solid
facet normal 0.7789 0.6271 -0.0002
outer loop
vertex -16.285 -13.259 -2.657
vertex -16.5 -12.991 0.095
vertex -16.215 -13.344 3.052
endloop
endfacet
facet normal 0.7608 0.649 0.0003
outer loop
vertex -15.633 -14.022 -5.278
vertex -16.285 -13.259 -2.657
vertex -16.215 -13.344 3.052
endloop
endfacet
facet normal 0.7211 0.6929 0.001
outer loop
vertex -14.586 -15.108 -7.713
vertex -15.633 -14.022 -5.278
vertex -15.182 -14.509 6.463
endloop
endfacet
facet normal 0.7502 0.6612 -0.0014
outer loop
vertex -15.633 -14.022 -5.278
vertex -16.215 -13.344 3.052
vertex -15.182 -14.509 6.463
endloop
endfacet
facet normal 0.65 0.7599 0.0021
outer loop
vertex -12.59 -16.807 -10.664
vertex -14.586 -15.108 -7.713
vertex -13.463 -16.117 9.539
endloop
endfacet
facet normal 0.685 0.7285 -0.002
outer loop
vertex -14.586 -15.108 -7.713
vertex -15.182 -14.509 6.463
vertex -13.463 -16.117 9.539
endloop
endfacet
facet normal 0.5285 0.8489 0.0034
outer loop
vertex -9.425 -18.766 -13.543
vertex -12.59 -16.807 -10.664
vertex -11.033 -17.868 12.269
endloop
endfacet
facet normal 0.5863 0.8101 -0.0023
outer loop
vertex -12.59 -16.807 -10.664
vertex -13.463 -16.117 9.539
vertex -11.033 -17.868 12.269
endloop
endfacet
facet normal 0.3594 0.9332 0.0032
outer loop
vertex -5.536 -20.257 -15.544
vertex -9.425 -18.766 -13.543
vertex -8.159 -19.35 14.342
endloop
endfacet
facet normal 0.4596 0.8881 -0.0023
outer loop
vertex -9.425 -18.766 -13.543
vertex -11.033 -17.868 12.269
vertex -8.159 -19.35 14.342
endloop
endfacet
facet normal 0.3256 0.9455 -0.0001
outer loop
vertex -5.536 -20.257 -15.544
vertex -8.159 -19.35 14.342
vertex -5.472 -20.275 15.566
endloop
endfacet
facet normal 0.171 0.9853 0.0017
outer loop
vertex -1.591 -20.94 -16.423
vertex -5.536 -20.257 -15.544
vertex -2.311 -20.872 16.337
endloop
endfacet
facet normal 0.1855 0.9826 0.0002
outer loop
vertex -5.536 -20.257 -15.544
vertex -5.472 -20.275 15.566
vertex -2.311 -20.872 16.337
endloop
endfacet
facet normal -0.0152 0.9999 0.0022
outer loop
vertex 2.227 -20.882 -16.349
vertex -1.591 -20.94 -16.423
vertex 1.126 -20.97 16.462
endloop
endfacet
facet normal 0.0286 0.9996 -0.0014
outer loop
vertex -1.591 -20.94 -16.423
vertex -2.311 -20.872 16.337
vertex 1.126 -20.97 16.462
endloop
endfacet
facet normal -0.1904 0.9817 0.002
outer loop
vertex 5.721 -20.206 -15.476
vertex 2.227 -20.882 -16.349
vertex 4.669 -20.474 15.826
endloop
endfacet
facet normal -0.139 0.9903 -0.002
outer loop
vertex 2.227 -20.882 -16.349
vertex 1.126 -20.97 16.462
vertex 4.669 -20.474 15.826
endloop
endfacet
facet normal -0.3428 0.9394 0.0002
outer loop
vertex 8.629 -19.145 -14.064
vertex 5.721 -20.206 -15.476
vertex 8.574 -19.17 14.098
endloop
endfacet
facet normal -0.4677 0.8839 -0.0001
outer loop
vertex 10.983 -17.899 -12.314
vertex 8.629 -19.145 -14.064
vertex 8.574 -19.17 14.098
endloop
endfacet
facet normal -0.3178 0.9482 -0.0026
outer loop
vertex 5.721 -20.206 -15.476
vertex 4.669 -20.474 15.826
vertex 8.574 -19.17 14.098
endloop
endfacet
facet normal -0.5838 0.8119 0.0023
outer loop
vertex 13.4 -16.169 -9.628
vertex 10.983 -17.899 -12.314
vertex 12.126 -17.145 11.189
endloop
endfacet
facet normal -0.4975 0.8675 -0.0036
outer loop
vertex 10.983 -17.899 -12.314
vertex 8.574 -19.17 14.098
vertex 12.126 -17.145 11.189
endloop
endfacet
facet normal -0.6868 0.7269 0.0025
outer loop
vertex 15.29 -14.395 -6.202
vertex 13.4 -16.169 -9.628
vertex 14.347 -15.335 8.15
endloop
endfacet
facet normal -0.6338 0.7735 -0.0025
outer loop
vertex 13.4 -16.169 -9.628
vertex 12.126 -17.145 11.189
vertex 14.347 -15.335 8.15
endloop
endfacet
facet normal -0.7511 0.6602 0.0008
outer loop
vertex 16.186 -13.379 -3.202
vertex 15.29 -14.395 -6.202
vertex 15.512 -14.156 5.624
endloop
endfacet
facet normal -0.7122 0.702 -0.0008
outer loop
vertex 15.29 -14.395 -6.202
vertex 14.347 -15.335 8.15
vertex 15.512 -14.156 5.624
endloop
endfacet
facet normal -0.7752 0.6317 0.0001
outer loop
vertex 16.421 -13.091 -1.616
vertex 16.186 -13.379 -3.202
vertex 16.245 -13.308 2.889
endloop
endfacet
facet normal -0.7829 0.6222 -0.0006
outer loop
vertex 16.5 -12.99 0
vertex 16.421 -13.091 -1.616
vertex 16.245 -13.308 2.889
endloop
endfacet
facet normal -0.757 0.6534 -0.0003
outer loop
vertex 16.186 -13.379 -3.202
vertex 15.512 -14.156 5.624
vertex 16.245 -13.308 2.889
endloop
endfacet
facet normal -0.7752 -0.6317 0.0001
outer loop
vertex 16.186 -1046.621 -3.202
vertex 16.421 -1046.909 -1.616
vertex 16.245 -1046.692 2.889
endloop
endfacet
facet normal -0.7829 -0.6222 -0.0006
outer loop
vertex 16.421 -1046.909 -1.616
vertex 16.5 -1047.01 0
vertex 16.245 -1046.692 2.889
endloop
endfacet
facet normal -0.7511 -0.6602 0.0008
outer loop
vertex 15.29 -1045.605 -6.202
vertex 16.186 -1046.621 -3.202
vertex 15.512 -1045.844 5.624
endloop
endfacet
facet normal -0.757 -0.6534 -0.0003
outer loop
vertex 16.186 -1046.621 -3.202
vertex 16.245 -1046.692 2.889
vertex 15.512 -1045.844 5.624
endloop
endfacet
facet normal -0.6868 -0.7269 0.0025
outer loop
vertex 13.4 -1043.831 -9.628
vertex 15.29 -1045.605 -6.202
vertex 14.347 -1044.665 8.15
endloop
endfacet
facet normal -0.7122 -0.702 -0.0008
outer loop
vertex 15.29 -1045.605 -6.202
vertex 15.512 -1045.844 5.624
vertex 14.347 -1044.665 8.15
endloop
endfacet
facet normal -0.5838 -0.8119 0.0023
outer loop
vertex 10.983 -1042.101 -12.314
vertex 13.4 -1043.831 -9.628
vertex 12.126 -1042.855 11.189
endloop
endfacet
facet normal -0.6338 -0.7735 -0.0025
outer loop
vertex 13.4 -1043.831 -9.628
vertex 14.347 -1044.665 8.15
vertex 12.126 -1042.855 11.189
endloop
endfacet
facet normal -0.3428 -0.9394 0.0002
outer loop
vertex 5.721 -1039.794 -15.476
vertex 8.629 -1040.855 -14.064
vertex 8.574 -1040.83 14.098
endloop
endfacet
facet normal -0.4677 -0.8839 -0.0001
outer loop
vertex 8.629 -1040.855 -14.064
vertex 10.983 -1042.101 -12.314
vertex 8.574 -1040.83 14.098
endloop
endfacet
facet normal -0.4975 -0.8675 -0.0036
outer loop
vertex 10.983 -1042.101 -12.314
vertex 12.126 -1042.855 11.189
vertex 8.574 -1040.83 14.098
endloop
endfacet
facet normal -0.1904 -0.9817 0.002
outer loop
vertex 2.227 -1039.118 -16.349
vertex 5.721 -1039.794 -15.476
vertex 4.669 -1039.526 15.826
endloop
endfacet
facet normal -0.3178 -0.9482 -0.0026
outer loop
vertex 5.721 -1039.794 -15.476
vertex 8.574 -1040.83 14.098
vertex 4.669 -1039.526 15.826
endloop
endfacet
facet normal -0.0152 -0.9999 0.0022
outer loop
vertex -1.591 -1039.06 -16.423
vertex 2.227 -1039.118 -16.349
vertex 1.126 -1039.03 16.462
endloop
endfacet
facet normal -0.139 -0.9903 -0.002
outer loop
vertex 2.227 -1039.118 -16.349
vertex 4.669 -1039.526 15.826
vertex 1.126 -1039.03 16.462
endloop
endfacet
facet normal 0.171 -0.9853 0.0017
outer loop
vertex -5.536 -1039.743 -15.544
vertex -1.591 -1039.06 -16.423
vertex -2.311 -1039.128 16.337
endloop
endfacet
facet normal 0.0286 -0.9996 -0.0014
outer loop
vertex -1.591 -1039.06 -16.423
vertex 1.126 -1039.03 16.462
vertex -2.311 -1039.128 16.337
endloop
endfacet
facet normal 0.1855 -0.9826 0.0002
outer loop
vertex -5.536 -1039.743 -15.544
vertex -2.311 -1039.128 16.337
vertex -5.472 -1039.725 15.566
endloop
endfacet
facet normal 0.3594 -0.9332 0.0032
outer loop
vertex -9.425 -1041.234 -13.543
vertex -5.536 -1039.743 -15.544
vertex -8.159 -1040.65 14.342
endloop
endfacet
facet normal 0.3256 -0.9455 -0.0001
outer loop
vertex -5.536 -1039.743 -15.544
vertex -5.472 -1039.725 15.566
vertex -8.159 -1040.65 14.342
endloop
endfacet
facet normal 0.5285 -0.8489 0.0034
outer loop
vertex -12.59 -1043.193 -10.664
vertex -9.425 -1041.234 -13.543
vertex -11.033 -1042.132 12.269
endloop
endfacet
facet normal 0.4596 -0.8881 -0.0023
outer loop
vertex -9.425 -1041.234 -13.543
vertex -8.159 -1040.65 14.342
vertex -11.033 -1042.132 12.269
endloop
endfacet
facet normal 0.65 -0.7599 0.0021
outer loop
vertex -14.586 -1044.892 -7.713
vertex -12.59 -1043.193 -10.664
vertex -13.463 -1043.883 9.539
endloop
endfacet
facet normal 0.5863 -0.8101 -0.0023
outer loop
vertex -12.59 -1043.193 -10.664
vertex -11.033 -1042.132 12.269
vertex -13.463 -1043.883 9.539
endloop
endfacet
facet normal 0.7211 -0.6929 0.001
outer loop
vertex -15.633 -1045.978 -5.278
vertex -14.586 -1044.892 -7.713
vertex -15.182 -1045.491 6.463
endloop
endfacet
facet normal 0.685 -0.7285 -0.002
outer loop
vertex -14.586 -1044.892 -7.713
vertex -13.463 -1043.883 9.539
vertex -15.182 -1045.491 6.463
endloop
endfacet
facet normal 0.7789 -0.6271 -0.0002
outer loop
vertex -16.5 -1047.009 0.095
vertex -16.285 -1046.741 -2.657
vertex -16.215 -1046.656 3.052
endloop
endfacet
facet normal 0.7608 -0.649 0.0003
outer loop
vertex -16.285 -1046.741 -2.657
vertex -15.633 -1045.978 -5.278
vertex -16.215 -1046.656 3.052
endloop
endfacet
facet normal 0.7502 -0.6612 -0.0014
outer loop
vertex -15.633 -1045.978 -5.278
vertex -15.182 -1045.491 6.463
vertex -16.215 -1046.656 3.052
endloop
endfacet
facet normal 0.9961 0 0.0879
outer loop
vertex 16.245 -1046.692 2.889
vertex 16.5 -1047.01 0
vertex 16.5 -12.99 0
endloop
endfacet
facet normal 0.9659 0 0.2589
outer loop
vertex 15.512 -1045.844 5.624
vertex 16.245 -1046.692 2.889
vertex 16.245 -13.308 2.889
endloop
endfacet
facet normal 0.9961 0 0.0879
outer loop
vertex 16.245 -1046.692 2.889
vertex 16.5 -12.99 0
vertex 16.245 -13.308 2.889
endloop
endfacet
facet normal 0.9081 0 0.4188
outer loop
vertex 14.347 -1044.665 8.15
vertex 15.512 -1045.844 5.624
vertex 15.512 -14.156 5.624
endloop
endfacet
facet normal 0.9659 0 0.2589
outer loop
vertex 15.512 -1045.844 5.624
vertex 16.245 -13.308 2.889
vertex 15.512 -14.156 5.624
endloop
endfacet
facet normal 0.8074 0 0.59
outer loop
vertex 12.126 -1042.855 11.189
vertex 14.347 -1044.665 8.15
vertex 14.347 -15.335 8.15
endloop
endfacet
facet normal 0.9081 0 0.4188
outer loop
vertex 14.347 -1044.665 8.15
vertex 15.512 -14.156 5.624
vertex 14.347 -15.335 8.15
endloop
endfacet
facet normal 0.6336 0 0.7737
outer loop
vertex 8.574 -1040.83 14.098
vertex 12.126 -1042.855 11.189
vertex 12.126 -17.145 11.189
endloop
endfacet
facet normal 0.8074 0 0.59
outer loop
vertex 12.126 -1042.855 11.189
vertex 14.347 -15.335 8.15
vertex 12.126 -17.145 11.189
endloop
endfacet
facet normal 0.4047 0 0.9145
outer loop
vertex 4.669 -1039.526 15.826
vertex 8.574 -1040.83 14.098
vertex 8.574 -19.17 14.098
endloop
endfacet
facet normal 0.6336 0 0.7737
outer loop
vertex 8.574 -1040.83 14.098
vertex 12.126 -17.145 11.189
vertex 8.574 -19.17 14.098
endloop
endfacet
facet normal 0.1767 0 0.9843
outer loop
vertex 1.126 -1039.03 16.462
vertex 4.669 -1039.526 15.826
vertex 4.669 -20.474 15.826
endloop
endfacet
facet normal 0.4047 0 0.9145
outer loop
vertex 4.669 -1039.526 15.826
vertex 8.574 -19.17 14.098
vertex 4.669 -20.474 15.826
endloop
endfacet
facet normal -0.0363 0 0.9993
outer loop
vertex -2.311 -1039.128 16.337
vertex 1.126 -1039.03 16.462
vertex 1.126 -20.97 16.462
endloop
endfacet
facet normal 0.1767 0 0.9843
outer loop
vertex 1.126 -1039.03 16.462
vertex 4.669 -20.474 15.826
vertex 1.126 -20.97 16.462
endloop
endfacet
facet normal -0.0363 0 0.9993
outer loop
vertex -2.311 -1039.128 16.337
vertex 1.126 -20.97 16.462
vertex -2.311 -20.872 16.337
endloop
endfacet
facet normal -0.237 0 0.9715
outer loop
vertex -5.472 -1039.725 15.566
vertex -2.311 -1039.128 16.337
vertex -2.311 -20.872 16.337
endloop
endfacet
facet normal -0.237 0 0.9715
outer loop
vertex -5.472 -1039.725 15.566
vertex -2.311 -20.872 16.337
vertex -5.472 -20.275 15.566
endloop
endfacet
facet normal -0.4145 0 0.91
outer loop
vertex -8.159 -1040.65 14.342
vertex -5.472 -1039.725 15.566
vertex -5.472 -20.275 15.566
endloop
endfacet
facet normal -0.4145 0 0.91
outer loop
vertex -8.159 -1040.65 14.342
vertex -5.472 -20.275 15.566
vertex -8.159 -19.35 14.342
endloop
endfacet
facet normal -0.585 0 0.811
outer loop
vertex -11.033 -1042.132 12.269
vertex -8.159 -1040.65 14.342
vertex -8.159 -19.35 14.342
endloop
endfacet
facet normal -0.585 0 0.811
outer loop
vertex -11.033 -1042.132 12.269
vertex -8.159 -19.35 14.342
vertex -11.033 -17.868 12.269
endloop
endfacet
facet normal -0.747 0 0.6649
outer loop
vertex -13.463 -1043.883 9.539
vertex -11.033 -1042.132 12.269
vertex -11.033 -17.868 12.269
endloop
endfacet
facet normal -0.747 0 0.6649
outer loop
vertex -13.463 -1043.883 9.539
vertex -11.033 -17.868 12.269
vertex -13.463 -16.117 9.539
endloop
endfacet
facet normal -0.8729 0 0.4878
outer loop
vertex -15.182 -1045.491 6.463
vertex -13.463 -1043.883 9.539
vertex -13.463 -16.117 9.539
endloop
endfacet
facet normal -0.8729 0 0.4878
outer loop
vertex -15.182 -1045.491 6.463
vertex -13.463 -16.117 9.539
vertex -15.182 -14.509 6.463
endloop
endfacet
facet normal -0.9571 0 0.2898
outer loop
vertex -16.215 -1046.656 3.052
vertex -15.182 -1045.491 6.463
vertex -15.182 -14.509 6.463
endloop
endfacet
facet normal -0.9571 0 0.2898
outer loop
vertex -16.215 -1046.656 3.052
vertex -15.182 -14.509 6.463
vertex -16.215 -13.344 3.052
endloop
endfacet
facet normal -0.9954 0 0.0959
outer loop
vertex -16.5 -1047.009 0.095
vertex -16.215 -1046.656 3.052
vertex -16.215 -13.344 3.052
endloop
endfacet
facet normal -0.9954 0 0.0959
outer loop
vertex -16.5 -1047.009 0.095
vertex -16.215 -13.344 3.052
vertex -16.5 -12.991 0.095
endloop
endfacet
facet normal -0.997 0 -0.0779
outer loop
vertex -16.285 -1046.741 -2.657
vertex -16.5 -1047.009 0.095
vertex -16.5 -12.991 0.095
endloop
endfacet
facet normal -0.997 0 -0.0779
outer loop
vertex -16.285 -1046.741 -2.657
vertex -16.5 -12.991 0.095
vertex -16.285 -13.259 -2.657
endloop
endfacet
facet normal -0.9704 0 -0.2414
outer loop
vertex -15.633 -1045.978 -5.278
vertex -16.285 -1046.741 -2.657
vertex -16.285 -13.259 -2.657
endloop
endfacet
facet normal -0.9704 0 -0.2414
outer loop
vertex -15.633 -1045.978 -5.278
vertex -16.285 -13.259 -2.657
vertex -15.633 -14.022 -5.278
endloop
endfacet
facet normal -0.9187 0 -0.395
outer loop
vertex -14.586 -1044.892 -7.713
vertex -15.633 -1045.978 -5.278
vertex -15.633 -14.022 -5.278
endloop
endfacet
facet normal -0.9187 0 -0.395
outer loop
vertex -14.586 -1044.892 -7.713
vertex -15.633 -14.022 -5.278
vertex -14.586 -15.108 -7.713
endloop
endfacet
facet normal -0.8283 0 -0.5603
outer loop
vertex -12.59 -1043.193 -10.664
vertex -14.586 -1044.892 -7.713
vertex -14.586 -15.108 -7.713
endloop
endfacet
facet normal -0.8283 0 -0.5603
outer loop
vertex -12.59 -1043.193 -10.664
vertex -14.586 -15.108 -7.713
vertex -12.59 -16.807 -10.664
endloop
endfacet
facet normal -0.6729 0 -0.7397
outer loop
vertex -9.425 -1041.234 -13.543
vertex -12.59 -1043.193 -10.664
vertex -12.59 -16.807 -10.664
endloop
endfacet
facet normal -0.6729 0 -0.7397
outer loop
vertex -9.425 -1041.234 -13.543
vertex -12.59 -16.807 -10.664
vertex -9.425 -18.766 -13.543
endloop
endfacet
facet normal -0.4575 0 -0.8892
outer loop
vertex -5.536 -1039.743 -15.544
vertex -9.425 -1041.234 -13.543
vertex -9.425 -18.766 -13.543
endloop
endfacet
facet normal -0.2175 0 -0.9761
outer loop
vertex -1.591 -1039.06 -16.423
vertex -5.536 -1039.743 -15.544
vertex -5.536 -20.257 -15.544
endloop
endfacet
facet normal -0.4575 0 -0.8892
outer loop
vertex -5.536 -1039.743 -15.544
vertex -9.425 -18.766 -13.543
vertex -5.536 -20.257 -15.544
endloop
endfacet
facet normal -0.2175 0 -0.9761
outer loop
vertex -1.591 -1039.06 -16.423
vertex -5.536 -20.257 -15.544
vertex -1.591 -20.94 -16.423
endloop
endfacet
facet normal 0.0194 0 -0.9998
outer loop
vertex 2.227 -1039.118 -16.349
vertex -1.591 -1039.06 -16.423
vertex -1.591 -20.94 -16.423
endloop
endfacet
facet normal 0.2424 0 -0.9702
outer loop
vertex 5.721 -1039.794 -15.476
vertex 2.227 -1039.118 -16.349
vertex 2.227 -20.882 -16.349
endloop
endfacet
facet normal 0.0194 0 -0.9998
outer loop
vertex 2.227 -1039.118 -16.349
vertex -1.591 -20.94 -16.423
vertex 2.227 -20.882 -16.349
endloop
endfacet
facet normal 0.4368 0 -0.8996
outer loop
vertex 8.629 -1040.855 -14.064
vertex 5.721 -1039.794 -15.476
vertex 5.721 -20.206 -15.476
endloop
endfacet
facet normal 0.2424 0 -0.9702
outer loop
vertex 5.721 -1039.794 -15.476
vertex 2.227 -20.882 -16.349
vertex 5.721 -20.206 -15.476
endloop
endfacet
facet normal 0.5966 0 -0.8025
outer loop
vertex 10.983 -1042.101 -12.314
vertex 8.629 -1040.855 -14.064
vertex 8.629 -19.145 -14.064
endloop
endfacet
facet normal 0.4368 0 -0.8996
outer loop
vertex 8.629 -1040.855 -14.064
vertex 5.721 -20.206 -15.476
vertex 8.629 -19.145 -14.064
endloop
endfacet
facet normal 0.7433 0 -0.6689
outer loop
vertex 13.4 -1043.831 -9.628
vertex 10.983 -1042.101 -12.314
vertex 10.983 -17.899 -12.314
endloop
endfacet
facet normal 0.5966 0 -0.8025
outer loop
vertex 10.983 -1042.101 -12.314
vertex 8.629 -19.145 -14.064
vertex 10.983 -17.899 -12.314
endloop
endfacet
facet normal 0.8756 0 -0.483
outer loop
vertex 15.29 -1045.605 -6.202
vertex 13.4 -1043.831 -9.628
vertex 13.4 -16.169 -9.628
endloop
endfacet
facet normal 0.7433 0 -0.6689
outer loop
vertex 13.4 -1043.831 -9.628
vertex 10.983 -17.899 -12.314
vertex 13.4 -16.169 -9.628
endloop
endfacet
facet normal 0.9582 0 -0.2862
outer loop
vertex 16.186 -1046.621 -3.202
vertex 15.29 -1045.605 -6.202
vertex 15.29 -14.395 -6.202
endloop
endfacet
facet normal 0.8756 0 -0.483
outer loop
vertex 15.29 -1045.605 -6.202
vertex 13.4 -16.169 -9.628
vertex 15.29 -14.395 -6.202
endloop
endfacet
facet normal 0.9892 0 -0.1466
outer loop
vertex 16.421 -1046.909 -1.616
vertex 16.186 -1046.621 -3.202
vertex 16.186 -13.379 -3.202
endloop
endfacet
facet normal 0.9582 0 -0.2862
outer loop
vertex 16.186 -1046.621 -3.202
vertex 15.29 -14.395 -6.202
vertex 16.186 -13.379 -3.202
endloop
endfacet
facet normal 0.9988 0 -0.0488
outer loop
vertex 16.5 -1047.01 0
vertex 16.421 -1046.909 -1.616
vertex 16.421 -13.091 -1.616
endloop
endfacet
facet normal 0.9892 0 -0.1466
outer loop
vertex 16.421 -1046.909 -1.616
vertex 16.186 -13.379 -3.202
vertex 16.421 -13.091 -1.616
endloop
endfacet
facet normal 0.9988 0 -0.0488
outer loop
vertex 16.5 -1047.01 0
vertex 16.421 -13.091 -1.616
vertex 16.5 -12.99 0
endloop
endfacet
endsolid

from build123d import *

# Parameters (mm, degrees)
F0_R     = 16.5
F1_DEPTH = 1060
F2_R     = 21
F3_DEPTH = 500
F5_DEPTH = 50


with BuildPart() as f1:
    # F0 (on Front) → F1 (new body)
    with BuildSketch(Plane.XZ):
        Circle(F0_R)
    extrude(amount=F1_DEPTH)

    # F2 (on Top) → F3 (cut, symmetric)
    with BuildSketch(Plane.XY):
        Circle(F2_R)
    extrude(amount=F3_DEPTH, both=True, mode=Mode.SUBTRACT)

    # F4 (on Top) → F5 (cut, symmetric)
    with BuildSketch(Plane.XY):
        with BuildLine():
            Line((-21, -1060), (0, -1060))
            Line((0, -1060), (21, -1060))
            ThreePointArc((21, -1060), (0, -1039), (-21, -1060))
        make_face()
    extrude(amount=F5_DEPTH, both=True, mode=Mode.SUBTRACT)


solid = f1.part
